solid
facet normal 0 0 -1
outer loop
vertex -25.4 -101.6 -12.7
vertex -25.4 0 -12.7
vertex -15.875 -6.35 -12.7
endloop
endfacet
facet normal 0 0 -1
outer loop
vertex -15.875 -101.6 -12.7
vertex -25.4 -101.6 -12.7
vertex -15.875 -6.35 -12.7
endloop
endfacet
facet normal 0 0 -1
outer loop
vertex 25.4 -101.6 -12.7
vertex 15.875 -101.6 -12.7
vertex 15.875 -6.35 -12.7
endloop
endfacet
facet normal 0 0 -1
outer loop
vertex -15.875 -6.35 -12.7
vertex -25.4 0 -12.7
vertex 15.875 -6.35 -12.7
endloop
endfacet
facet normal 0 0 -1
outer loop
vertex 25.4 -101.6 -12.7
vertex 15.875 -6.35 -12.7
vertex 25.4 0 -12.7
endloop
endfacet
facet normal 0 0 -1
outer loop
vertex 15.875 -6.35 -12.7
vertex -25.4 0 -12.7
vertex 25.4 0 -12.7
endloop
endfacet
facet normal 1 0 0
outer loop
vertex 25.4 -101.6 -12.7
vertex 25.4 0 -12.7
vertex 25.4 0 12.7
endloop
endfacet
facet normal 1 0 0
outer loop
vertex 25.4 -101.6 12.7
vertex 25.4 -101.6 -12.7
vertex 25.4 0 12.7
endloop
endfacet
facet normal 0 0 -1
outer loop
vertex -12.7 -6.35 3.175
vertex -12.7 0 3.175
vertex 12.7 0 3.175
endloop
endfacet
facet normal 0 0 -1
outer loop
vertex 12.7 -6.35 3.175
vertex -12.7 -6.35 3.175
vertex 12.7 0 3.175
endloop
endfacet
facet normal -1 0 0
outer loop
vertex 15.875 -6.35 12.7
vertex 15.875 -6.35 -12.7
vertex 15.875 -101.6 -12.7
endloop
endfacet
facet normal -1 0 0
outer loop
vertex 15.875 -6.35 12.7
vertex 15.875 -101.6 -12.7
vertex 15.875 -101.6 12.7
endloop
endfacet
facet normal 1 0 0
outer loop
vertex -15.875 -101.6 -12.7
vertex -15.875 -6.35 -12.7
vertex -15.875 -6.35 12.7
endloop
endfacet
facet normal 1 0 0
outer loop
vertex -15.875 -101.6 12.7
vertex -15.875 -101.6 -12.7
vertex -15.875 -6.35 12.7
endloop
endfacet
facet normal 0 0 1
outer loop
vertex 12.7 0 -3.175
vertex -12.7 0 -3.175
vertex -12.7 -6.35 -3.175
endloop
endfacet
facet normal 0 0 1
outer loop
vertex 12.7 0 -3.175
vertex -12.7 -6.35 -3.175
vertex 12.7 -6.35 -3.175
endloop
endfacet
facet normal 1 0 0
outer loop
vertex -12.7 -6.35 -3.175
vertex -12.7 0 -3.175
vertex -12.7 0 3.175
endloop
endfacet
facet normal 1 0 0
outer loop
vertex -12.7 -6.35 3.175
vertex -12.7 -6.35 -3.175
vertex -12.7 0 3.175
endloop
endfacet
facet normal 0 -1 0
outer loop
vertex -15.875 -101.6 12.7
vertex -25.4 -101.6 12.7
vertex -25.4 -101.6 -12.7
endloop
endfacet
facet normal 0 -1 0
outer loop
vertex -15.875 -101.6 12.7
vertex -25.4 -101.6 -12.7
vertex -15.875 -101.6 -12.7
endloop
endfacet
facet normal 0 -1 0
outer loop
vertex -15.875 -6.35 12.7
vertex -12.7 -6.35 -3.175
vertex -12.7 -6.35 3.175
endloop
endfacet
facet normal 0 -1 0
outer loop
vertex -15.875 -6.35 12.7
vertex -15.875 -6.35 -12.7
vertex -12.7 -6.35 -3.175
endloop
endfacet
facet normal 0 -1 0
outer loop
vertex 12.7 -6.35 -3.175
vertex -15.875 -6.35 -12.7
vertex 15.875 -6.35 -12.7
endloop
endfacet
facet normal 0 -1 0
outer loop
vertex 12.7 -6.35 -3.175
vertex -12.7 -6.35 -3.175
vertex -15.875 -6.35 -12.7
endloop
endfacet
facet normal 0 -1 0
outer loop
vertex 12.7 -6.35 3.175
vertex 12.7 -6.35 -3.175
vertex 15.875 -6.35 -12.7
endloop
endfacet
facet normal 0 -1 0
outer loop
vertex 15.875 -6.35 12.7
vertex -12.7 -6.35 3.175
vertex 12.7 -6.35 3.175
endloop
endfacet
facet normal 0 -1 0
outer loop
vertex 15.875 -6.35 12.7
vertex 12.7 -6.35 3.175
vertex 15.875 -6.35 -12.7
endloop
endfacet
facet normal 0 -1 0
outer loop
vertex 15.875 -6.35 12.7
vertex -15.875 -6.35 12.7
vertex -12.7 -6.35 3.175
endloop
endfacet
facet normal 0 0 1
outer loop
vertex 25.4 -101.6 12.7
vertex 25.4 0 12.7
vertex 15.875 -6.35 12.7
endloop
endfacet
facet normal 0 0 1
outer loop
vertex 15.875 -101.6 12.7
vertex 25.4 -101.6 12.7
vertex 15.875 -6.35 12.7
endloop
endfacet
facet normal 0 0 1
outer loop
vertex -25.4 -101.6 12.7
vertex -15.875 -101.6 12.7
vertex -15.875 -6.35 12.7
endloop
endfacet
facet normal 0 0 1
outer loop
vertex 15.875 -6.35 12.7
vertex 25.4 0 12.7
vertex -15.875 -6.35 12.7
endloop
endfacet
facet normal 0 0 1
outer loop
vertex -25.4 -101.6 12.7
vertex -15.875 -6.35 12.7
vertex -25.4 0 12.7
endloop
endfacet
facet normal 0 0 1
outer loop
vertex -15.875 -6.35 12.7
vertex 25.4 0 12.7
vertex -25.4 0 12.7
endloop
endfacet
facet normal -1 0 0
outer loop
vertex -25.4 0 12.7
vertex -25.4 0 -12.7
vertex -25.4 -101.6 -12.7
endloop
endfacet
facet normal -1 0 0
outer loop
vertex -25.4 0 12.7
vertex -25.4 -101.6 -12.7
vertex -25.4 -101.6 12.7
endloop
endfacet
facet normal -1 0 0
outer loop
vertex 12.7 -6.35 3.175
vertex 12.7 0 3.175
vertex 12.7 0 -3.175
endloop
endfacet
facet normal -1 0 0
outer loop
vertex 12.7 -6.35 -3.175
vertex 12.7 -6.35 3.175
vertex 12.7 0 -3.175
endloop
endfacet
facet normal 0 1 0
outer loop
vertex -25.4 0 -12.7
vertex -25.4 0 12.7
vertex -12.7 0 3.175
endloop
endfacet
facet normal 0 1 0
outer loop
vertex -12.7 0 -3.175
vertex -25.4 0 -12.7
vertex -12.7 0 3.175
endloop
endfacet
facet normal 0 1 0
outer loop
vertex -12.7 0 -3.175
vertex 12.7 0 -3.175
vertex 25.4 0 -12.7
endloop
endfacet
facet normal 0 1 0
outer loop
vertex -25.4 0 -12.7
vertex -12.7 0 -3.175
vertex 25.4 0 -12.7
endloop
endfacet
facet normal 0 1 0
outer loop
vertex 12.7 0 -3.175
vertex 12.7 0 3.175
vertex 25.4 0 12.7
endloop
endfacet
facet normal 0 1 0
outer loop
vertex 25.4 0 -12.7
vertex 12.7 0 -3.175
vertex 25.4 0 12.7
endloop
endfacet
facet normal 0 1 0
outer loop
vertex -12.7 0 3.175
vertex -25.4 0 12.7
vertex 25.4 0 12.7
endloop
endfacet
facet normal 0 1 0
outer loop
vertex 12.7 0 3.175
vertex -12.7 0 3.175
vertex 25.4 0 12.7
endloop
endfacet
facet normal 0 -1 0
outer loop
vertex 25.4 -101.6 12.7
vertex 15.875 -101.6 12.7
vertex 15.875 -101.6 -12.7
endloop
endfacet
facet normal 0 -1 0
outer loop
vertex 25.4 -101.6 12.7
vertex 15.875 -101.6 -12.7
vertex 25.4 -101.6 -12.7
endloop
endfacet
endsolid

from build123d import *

# Parameters (mm, degrees)
F0_W     = 9.525
F0_H     = 25.4
F0_W_2   = 25.4
F0_H_2   = 9.525
F1_DEPTH = 6.35
F2_DEPTH = 101.6


with BuildPart() as f1:
    # F0 (on Front) → F1 (new body)
    with BuildSketch(Plane.XZ):
        with Locations((20.6375, 0)):
            Rectangle(F0_W, F0_H)
        Polygon((12.7, -12.7), (15.875, -12.7), (15.875, 12.7), (12.7, 12.7), (12.7, 3.175), (12.7, -3.175), align=None)
        with Locations((0, -7.9375)):
            Rectangle(F0_W_2, F0_H_2)
        Polygon((-15.875, -12.7), (-12.7, -12.7), (-12.7, -3.175), (-12.7, 3.175), (-12.7, 12.7), (-15.875, 12.7), align=None)
        with Locations((0, 7.9375)):
            Rectangle(F0_W_2, F0_H_2)
        with Locations((-20.6375, 0)):
            Rectangle(F0_W, F0_H)
    extrude(amount=F1_DEPTH)

    # F0 (on Front) → F2 (join)
    with BuildSketch(Plane.XZ):
        with Locations((20.6375, 0)):
            Rectangle(F0_W, F0_H)
        with Locations((-20.6375, 0)):
            Rectangle(F0_W, F0_H)
    extrude(amount=F2_DEPTH)


solid = f1.part
